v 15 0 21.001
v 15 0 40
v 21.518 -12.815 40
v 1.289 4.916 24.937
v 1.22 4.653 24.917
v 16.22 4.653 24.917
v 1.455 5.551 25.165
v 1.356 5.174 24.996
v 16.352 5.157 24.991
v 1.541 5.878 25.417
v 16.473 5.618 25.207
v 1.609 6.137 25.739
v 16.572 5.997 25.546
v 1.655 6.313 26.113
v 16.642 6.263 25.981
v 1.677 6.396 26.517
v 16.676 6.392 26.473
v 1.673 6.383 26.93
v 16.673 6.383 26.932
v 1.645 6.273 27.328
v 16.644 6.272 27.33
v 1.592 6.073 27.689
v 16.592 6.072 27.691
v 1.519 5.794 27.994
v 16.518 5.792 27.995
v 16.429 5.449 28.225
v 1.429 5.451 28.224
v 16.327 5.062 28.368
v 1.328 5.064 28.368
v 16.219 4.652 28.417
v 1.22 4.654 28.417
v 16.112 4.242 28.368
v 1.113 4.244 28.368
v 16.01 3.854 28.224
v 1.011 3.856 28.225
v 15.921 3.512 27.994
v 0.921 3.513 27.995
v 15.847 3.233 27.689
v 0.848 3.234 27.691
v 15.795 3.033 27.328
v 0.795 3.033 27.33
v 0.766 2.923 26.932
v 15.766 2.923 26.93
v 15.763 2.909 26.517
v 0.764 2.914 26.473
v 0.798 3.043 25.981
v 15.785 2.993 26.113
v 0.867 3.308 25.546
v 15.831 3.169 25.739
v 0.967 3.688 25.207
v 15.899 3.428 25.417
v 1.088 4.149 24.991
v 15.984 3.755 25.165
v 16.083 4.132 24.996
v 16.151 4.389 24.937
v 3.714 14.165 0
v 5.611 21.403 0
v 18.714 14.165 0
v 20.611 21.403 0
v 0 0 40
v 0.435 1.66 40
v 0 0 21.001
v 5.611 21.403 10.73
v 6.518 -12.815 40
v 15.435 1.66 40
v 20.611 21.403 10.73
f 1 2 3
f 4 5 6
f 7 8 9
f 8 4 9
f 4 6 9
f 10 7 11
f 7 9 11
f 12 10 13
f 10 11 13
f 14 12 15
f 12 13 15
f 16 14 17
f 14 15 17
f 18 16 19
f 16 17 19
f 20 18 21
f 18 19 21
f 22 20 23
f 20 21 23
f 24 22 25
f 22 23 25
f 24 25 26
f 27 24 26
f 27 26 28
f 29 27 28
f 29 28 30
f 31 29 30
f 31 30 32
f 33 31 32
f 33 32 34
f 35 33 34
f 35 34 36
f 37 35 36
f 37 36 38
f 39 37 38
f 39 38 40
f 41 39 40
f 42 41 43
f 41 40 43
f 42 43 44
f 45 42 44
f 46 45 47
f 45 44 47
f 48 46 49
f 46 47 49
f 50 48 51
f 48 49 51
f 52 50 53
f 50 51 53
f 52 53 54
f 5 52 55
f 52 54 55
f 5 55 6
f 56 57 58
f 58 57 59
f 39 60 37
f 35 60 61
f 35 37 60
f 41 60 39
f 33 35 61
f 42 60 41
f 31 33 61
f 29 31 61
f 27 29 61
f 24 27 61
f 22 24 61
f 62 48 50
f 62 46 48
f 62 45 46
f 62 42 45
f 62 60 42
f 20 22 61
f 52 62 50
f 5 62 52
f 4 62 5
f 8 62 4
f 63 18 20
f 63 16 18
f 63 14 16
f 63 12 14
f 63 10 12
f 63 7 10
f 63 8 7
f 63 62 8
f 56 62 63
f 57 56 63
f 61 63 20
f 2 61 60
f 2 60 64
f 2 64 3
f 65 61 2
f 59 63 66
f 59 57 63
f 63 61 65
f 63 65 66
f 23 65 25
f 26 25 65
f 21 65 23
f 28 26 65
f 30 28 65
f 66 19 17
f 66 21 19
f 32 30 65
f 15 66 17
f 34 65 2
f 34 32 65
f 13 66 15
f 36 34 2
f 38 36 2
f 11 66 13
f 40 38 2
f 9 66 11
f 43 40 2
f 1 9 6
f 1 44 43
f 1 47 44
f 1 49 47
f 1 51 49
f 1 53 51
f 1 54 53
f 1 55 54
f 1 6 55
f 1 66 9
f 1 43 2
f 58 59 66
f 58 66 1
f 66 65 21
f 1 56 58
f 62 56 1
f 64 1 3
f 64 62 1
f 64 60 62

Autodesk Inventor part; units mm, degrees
sketch "Sketch1" plane through (0, 0, 0) normal (0, 0, 1) x (1, 0, 0)
  line L0 (0, 0) -> (5.6109, 21.4027)
  line L1 (5.6109, 21.4027) -> (20.6109, 21.4027)
  line L2 (20.6109, 21.4027) -> (15, 0)
  line L3 (15, 0) -> (21.9438, -13.6515)
  line L4 (21.9438, -13.6515) -> (6.9438, -13.6515)
  line L5 (0, 0) -> (6.9438, -13.6515)
  line L6 (0, 0) -> (0, 15.6682) construction
  dimension "d0" = 138.35
  dimension "d1" = 138.35
  dimension "d2" = 15.316
  dimension "d3" = 22.126
  dimension "d4" = 15
  dimension "d5" = 14.69
extrude "Extrusion1" add sketch "Sketch1" along normal blind 40
ref_plane "Work Plane1" through (18.4719, 13.2435, 1) normal (1, 0, 0) x (0, 0, -1)
sketch "Sketch3" plane through (18.4719, 13.2435, 1) normal (1, 0, 0) x (0, 0, -1)
  circle A0 centre (-25.6667, -8.5907) radius 1.75
  line L0 (1, 8.1593) -> (1, -13.2435) projected
  line L1 (-39, -13.2435) -> (-39, 8.1593) projected
  line L2 (1, 8.1593) -> (-39, 8.1593) projected
  dimension "d11" = 3.5
  dimension "d12" = 26.6667
  dimension "d13" = 13.3333
  dimension "d14" = 15
extrude "Extrusion3" cut sketch "Sketch3" against normal through all
ref_plane "Work Plane9" through (5.6109, 21.4027, 0) normal (0, -0.829, -0.5592) x (1, 0, 0)
ref_plane "Work Plane8" through (21.9438, -13.6515, 40) normal (0, -1, 0) x (1, 0, 0)
ref_plane "Work Plane10" through (5.6109, 16.4285, -3.3552) normal (0, -0.829, -0.5592) x (1, 0, 0)
ref_plane "Work Plane11" through (5.6109, 26.377, 3.3552) normal (0, -0.829, -0.5592) x (1, 0, 0)
split "Split7" plane through (5.6109, 26.377, 3.3552) removes the side toward (0, 0.829, 0.5592)
split "Split8" plane through (5.6109, 16.4285, -3.3552) removes the side toward (0, -0.829, -0.5592)
equation "\"d1\" = d0"
equation "\"d12\" = 2 * d13"
properties part number "Screen Adapter"
